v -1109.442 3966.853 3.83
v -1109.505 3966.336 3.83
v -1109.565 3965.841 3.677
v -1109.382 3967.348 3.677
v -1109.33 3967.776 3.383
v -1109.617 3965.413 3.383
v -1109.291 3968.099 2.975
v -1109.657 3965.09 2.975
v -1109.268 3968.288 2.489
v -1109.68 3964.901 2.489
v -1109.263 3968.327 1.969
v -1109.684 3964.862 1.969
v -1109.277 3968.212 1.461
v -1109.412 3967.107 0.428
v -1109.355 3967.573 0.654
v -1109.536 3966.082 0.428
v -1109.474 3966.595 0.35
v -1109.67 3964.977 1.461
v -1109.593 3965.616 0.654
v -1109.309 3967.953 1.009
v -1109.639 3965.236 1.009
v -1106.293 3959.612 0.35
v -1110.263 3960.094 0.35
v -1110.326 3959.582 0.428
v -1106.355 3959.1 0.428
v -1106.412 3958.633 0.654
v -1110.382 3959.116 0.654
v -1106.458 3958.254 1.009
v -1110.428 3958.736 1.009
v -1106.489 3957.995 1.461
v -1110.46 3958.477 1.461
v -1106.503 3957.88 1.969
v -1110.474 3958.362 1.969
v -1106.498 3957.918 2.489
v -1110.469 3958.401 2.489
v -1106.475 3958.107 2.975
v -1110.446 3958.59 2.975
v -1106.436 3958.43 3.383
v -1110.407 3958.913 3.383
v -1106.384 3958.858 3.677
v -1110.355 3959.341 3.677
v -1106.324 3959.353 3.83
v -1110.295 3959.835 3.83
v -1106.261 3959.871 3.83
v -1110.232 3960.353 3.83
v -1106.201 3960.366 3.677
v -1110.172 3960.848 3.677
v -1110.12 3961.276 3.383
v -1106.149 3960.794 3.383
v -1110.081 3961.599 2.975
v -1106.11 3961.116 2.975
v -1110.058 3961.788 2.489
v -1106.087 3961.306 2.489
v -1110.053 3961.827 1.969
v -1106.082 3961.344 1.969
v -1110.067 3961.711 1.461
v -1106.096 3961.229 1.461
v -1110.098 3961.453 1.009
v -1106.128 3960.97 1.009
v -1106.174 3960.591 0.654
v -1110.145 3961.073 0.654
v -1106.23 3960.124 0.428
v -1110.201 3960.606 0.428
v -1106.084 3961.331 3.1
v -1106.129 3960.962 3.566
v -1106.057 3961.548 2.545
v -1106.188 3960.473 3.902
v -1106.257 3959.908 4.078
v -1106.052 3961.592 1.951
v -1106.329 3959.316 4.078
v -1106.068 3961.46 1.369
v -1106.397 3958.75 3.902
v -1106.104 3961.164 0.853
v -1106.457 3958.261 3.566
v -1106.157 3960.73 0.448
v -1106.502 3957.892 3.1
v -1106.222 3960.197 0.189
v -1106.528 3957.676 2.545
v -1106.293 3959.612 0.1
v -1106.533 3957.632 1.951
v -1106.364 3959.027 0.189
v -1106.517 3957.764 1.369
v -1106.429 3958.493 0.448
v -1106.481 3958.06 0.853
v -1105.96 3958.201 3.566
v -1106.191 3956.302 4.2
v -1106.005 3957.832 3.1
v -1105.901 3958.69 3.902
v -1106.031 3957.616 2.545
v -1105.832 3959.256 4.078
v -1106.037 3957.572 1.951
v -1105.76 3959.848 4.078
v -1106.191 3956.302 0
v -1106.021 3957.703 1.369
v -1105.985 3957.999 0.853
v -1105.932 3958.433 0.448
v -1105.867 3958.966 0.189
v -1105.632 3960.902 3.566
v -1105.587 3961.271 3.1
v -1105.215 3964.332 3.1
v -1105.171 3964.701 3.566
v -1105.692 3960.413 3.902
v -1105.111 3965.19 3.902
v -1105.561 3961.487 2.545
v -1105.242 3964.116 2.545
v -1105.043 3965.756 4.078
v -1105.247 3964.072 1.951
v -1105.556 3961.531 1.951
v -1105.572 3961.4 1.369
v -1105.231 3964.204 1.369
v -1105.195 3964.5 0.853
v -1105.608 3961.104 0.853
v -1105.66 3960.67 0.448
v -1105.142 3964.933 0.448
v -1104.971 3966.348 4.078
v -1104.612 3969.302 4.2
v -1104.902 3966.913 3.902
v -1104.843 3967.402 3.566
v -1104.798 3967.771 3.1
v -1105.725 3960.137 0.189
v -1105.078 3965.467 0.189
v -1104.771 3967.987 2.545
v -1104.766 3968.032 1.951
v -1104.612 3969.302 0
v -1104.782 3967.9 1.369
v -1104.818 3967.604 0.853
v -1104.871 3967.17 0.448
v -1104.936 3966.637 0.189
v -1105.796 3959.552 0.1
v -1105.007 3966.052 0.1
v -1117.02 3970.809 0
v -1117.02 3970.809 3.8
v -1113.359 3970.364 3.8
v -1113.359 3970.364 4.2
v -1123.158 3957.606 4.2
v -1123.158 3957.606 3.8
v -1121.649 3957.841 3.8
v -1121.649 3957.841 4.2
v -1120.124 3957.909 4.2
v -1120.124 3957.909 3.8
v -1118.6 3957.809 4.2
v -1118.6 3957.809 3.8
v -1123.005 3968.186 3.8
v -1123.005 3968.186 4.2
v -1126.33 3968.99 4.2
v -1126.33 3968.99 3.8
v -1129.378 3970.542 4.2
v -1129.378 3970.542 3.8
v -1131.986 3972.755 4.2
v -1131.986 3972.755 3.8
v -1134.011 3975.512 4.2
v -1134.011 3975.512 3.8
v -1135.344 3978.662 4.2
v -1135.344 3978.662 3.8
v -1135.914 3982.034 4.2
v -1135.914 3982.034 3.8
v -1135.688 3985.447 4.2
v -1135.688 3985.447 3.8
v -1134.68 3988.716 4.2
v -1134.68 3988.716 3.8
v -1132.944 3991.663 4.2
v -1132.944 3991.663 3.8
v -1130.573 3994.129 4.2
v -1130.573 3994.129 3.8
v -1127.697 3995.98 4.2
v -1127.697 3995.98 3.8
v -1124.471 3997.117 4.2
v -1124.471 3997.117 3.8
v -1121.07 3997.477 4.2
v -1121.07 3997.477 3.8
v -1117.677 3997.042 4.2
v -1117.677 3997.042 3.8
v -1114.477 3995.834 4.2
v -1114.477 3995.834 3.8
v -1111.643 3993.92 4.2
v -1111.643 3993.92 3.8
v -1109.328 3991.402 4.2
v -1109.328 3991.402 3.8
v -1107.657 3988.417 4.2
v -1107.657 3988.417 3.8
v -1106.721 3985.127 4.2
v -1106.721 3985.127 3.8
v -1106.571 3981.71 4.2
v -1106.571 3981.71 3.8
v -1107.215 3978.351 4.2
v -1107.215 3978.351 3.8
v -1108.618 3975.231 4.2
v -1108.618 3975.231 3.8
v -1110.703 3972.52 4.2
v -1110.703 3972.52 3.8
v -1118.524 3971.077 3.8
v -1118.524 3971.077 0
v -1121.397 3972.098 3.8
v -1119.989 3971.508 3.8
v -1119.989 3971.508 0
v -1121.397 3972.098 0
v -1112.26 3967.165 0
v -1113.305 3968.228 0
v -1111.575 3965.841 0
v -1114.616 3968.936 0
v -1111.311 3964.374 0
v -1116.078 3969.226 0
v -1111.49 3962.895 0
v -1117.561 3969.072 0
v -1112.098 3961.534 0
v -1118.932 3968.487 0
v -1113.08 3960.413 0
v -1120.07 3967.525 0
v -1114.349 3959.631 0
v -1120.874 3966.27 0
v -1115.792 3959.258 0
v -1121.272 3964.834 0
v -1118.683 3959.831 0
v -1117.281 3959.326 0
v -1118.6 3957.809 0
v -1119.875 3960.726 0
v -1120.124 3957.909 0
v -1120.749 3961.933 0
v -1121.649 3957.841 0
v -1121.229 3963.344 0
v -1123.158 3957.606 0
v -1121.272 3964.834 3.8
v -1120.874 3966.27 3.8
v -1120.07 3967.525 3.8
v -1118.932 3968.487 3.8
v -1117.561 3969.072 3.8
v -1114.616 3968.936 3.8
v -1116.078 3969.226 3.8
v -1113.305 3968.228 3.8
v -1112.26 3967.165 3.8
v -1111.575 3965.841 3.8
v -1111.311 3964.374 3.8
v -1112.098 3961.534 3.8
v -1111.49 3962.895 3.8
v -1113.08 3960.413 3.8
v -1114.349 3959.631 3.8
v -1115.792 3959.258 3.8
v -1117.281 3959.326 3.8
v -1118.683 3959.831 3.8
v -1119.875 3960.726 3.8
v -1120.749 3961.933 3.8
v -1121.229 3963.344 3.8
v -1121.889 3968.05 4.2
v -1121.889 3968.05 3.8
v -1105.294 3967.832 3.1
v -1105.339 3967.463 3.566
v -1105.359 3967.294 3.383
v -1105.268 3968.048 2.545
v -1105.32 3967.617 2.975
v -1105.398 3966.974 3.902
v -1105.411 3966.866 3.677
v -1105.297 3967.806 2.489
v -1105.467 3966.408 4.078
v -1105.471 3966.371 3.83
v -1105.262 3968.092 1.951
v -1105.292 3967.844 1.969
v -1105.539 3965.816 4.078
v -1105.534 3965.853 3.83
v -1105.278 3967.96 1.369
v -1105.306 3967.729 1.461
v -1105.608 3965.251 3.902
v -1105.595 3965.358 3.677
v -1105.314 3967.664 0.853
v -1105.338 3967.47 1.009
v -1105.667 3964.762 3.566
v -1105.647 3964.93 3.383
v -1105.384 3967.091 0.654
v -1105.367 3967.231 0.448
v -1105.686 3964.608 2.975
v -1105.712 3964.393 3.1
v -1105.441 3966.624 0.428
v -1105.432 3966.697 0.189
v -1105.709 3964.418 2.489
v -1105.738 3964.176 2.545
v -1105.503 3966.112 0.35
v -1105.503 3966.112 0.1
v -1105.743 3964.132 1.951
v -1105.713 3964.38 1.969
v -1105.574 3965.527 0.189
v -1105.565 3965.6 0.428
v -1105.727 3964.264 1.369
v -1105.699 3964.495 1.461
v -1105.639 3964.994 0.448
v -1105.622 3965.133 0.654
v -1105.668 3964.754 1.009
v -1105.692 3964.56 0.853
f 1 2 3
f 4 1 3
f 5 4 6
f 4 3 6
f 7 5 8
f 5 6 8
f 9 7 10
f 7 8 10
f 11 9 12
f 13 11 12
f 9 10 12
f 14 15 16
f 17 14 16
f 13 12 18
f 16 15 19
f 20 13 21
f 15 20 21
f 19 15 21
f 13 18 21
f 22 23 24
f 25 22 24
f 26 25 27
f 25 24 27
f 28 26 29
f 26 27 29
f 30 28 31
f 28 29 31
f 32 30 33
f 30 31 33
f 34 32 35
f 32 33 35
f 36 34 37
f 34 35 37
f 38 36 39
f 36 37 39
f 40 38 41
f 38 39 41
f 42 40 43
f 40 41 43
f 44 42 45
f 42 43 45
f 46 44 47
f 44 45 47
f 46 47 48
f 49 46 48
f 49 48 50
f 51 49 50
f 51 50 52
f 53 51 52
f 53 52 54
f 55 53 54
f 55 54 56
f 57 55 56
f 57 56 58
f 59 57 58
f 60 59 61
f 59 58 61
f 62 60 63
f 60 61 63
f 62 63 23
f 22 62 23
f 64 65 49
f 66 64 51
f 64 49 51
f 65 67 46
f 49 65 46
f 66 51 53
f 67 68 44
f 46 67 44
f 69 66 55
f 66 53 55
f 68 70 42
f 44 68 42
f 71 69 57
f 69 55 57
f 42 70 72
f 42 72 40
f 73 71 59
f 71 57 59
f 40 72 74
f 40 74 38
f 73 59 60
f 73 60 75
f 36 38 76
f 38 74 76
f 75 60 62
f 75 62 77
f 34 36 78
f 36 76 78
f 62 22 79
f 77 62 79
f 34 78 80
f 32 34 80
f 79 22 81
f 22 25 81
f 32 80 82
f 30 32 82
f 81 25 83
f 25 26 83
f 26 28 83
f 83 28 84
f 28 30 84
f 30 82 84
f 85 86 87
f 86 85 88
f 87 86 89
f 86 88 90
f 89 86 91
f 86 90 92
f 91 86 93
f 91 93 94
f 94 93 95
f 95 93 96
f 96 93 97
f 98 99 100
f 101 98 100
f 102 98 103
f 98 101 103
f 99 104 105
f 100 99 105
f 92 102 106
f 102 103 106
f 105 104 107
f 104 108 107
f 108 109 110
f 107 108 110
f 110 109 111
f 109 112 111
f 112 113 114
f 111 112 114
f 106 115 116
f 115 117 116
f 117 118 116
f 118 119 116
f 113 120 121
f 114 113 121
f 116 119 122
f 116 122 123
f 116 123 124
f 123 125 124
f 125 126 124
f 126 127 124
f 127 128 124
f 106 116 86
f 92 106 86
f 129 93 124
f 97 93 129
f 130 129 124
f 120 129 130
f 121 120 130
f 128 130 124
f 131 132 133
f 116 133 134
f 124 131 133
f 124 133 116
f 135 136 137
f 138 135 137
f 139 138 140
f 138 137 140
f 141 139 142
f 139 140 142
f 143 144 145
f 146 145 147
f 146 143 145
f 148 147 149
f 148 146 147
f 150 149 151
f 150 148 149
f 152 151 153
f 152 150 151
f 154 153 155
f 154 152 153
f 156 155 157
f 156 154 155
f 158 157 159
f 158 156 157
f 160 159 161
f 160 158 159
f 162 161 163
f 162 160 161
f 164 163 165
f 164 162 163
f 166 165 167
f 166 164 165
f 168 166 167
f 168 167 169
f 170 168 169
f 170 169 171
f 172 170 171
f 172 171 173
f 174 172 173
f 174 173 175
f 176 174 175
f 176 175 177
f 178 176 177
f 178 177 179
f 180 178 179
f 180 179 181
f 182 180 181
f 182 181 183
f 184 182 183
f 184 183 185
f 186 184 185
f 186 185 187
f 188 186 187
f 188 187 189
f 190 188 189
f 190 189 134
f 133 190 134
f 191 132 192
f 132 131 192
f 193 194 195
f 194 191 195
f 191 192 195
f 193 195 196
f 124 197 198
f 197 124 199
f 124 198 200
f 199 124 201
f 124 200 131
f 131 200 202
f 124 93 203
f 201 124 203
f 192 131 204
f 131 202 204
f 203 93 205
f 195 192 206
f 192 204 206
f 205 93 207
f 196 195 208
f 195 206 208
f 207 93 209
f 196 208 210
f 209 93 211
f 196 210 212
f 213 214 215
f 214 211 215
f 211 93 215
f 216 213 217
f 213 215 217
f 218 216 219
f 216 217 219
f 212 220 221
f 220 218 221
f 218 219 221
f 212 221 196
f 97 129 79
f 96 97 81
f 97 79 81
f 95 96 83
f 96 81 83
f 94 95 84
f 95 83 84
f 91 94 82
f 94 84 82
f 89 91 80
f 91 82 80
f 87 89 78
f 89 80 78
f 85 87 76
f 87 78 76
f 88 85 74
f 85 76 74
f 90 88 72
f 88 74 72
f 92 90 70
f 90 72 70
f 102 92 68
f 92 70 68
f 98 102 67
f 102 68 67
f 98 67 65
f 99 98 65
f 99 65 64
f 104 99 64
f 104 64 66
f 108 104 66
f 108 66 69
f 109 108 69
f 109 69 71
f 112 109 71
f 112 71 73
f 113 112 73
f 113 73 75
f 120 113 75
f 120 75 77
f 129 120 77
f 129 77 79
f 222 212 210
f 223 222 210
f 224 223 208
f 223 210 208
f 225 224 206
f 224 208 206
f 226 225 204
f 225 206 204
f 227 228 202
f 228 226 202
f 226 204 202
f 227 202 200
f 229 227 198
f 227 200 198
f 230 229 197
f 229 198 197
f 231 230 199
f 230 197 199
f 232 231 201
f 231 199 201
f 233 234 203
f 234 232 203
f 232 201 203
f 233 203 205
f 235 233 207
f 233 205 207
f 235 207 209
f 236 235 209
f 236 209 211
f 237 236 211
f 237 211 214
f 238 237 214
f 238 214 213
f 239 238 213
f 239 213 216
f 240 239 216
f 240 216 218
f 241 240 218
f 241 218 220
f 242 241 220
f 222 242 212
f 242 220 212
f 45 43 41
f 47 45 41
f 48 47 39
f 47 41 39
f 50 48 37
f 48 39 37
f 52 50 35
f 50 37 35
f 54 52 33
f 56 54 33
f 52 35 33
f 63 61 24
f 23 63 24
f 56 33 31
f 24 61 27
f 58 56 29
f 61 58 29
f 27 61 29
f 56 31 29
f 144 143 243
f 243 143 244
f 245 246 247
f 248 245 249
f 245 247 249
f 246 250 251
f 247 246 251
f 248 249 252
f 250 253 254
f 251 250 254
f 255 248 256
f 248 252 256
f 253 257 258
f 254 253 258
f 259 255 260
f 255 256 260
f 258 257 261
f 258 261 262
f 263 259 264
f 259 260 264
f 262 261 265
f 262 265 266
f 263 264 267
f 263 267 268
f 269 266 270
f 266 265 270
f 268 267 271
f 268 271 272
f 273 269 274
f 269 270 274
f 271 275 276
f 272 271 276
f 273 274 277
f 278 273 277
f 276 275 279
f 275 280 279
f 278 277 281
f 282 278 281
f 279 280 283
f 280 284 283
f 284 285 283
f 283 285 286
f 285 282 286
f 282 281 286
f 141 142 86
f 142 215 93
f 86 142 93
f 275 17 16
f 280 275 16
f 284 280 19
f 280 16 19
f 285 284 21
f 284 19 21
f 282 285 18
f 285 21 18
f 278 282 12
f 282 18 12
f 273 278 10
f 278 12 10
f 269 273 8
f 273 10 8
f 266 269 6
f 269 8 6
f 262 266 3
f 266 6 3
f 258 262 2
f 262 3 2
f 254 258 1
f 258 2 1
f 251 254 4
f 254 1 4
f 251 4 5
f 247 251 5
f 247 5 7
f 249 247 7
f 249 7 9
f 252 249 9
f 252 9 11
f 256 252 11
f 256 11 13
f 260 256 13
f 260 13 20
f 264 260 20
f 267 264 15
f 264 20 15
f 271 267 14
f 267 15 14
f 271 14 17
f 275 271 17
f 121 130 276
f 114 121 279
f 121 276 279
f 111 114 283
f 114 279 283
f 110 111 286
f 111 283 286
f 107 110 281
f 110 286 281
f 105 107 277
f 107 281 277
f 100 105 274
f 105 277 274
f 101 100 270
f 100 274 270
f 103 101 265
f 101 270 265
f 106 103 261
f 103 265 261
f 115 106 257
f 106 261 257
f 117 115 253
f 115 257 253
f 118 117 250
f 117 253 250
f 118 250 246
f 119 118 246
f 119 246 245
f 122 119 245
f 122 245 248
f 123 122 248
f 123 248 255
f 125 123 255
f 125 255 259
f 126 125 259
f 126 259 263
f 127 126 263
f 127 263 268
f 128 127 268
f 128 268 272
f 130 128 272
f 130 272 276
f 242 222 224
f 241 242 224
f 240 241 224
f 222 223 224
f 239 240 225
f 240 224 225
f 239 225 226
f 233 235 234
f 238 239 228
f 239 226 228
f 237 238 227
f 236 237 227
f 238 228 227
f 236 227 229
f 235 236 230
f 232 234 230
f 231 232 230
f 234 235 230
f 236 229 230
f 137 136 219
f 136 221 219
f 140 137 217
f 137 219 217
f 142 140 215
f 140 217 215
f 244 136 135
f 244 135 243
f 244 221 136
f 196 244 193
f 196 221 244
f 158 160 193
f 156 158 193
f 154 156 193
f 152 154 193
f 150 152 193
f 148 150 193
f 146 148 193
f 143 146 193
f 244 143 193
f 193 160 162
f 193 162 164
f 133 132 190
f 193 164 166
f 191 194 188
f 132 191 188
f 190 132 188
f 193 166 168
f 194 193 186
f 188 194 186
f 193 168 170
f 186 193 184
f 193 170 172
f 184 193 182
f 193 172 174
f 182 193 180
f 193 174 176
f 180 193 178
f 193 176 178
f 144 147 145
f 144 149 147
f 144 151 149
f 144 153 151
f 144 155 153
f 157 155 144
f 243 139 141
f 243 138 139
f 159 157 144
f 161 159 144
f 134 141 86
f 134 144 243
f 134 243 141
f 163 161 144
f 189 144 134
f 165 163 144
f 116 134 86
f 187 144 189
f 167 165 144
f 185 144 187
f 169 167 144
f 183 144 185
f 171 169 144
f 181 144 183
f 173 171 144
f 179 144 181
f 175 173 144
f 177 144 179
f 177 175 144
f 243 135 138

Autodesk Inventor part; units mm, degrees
ref_plane "Work Plane1" through (-1107.6248, 3927.9173, 0) normal (0, 0, 1) x (-0.9927008, 0.1206028, 0)
sketch "Sketch1" plane through (-1107.6248, 3927.9173, 0) normal (0, 0, 1) x (-0.9927008, 0.1206028, 0)
  circle A0 centre (14.5, -14.5) radius 13.85 projected
  circle A1 centre (14.5, -14.5) radius 14.5 projected
  circle A2 centre (14.5, -55.2958) radius 13.85 projected
  circle A3 centre (14.5, -55.2958) radius 14.5 projected
  circle A4 centre (13, -35.0012) radius 5 projected
  line L0 (0, 0) -> (29, 0)
  line L1 (29, 0) -> (29, -67)
  line L2 (29, -67) -> (0, -67)
  line L3 (0, -67) -> (0, 0)
  line L4 (2, 0) -> (2, -67)
  line L5 (14.5, -28.35) -> (2, -28.35)
  line L6 (14.5, -29) -> (2, -29)
  line L7 (14.5, -40.7958) -> (2, -40.7958)
  line L8 (14.5, -41.4458) -> (2, -41.4458)
  line L9 (19, 0) -> (19, -67)
  point P0 (-1573.2578, 3765.6642)
  point P1 (19, -42.1973)
  point P2 (19, -27.5986)
  point P3 (19, -41.5118)
  point P4 (19, -28.284)
  dimension "d0" = 67
  dimension "d1" = 2
  dimension "d2" = 1
ref_plane "Work Plane7" through (-17.5791, -32.927, 3.4) normal (0, 0, -1) x (0.0194385, 0.9998111, 0)
extrude "Extrusion1" add sketch "Sketch1" along normal blind 3.8 contours L9 A1 L5 A0 | L9 A3 L7 L4 L6 A1 | A1 L6 L4 L5 | L9 A2 L8 A3 | A3 L8 L4 L7
ref_plane "Work Plane8" through (-22.6017, 2.8462, 4) normal (0, 0, -1) x (0.4990785, 0.8665568, 0)
ref_plane "Work Plane9" through (151.4324, -161.9595, 4) normal (0, 0, 1) x (0.0950598, 0.9954716, 0)
sketch "Sketch2" plane through (-1107.6248, 3927.9173, 3.8) normal (0, 0, 1) x (0.9927008, -0.1206028, 0)
  arc A0 (-19, 42.1973) -> (-14.5, 41.4458) centre (-14.5, 55.2958) ccw projected
  line L0 (-19, 42.1973) -> (-19, 27.5986) projected
  arc A1 (-14.5, 28.35) -> (-19, 27.5986) centre (-14.5, 14.5) ccw projected
  line L1 (-14.5, 28.35) -> (-2, 28.35) projected
  line L2 (-2, 28.35) -> (-2, 41.4458) projected
  line L3 (-2, 41.4458) -> (-14.5, 41.4458) projected
  circle A2 centre (-13, 35.0012) radius 5 projected
  circle A3 centre (-20.1246, 52.8194) radius 14.7 projected
  line L4 (-20.1246, 38.1194) -> (-2, 38.1194)
  line L5 (-2, 28.35) -> (-2, 41.4458) projected
  line L6 (-20.1246, 52.8194) -> (-20.1246, 38.1194)
  point P0 (-2, 38.1194)
  point P1 (-19, 38.1625)
  point P2 (-10.8116, 41.4458)
  point P3 (-19, 38.1194)
extrude "Extrusion4" add sketch "Sketch2" along normal blind 0.4
sketch "Sketch3" plane through (-1106.1911, 3956.3016, 0) normal (0.9927008, -0.1206028, 0) x (0, 0, -1)
  line L0 (0, 0) -> (-4.2, 0) projected
  line L1 (0, 0) -> (0, 13.0958) projected
  line L2 (0, 13.0958) -> (-4.2, 13.0958) projected
  line L3 (-4.2, 6.5479) -> (0, 6.5479)
  line L4 (-4.2, 6.5479) -> (0, 0)
  line L5 (-4.2, 6.5479) -> (0, 13.0958)
  line L6 (0, 6.5479) -> (-2.1, 9.8219)
  line L7 (0, 6.5479) -> (-2.1, 3.274)
  line L8 (-4.2, 0) -> (-4.2, 13.0958) projected
  point P0 (0, -3794.0142)
  dimension "d11" = 6.5479
  dimension "d12" = 6.5479
hole "Hole1" at (-1105.7963, 3959.5516, 2.1) at (-1105.0066, 3966.0518, 2.1) direction (-0.9927008, 0.1206028, 0) diameter 3.5 depth 4.5 counterbore diameter 4 counterbore depth 0.5
equation "\"d11\" = d12"
properties part number "BearigHold"
